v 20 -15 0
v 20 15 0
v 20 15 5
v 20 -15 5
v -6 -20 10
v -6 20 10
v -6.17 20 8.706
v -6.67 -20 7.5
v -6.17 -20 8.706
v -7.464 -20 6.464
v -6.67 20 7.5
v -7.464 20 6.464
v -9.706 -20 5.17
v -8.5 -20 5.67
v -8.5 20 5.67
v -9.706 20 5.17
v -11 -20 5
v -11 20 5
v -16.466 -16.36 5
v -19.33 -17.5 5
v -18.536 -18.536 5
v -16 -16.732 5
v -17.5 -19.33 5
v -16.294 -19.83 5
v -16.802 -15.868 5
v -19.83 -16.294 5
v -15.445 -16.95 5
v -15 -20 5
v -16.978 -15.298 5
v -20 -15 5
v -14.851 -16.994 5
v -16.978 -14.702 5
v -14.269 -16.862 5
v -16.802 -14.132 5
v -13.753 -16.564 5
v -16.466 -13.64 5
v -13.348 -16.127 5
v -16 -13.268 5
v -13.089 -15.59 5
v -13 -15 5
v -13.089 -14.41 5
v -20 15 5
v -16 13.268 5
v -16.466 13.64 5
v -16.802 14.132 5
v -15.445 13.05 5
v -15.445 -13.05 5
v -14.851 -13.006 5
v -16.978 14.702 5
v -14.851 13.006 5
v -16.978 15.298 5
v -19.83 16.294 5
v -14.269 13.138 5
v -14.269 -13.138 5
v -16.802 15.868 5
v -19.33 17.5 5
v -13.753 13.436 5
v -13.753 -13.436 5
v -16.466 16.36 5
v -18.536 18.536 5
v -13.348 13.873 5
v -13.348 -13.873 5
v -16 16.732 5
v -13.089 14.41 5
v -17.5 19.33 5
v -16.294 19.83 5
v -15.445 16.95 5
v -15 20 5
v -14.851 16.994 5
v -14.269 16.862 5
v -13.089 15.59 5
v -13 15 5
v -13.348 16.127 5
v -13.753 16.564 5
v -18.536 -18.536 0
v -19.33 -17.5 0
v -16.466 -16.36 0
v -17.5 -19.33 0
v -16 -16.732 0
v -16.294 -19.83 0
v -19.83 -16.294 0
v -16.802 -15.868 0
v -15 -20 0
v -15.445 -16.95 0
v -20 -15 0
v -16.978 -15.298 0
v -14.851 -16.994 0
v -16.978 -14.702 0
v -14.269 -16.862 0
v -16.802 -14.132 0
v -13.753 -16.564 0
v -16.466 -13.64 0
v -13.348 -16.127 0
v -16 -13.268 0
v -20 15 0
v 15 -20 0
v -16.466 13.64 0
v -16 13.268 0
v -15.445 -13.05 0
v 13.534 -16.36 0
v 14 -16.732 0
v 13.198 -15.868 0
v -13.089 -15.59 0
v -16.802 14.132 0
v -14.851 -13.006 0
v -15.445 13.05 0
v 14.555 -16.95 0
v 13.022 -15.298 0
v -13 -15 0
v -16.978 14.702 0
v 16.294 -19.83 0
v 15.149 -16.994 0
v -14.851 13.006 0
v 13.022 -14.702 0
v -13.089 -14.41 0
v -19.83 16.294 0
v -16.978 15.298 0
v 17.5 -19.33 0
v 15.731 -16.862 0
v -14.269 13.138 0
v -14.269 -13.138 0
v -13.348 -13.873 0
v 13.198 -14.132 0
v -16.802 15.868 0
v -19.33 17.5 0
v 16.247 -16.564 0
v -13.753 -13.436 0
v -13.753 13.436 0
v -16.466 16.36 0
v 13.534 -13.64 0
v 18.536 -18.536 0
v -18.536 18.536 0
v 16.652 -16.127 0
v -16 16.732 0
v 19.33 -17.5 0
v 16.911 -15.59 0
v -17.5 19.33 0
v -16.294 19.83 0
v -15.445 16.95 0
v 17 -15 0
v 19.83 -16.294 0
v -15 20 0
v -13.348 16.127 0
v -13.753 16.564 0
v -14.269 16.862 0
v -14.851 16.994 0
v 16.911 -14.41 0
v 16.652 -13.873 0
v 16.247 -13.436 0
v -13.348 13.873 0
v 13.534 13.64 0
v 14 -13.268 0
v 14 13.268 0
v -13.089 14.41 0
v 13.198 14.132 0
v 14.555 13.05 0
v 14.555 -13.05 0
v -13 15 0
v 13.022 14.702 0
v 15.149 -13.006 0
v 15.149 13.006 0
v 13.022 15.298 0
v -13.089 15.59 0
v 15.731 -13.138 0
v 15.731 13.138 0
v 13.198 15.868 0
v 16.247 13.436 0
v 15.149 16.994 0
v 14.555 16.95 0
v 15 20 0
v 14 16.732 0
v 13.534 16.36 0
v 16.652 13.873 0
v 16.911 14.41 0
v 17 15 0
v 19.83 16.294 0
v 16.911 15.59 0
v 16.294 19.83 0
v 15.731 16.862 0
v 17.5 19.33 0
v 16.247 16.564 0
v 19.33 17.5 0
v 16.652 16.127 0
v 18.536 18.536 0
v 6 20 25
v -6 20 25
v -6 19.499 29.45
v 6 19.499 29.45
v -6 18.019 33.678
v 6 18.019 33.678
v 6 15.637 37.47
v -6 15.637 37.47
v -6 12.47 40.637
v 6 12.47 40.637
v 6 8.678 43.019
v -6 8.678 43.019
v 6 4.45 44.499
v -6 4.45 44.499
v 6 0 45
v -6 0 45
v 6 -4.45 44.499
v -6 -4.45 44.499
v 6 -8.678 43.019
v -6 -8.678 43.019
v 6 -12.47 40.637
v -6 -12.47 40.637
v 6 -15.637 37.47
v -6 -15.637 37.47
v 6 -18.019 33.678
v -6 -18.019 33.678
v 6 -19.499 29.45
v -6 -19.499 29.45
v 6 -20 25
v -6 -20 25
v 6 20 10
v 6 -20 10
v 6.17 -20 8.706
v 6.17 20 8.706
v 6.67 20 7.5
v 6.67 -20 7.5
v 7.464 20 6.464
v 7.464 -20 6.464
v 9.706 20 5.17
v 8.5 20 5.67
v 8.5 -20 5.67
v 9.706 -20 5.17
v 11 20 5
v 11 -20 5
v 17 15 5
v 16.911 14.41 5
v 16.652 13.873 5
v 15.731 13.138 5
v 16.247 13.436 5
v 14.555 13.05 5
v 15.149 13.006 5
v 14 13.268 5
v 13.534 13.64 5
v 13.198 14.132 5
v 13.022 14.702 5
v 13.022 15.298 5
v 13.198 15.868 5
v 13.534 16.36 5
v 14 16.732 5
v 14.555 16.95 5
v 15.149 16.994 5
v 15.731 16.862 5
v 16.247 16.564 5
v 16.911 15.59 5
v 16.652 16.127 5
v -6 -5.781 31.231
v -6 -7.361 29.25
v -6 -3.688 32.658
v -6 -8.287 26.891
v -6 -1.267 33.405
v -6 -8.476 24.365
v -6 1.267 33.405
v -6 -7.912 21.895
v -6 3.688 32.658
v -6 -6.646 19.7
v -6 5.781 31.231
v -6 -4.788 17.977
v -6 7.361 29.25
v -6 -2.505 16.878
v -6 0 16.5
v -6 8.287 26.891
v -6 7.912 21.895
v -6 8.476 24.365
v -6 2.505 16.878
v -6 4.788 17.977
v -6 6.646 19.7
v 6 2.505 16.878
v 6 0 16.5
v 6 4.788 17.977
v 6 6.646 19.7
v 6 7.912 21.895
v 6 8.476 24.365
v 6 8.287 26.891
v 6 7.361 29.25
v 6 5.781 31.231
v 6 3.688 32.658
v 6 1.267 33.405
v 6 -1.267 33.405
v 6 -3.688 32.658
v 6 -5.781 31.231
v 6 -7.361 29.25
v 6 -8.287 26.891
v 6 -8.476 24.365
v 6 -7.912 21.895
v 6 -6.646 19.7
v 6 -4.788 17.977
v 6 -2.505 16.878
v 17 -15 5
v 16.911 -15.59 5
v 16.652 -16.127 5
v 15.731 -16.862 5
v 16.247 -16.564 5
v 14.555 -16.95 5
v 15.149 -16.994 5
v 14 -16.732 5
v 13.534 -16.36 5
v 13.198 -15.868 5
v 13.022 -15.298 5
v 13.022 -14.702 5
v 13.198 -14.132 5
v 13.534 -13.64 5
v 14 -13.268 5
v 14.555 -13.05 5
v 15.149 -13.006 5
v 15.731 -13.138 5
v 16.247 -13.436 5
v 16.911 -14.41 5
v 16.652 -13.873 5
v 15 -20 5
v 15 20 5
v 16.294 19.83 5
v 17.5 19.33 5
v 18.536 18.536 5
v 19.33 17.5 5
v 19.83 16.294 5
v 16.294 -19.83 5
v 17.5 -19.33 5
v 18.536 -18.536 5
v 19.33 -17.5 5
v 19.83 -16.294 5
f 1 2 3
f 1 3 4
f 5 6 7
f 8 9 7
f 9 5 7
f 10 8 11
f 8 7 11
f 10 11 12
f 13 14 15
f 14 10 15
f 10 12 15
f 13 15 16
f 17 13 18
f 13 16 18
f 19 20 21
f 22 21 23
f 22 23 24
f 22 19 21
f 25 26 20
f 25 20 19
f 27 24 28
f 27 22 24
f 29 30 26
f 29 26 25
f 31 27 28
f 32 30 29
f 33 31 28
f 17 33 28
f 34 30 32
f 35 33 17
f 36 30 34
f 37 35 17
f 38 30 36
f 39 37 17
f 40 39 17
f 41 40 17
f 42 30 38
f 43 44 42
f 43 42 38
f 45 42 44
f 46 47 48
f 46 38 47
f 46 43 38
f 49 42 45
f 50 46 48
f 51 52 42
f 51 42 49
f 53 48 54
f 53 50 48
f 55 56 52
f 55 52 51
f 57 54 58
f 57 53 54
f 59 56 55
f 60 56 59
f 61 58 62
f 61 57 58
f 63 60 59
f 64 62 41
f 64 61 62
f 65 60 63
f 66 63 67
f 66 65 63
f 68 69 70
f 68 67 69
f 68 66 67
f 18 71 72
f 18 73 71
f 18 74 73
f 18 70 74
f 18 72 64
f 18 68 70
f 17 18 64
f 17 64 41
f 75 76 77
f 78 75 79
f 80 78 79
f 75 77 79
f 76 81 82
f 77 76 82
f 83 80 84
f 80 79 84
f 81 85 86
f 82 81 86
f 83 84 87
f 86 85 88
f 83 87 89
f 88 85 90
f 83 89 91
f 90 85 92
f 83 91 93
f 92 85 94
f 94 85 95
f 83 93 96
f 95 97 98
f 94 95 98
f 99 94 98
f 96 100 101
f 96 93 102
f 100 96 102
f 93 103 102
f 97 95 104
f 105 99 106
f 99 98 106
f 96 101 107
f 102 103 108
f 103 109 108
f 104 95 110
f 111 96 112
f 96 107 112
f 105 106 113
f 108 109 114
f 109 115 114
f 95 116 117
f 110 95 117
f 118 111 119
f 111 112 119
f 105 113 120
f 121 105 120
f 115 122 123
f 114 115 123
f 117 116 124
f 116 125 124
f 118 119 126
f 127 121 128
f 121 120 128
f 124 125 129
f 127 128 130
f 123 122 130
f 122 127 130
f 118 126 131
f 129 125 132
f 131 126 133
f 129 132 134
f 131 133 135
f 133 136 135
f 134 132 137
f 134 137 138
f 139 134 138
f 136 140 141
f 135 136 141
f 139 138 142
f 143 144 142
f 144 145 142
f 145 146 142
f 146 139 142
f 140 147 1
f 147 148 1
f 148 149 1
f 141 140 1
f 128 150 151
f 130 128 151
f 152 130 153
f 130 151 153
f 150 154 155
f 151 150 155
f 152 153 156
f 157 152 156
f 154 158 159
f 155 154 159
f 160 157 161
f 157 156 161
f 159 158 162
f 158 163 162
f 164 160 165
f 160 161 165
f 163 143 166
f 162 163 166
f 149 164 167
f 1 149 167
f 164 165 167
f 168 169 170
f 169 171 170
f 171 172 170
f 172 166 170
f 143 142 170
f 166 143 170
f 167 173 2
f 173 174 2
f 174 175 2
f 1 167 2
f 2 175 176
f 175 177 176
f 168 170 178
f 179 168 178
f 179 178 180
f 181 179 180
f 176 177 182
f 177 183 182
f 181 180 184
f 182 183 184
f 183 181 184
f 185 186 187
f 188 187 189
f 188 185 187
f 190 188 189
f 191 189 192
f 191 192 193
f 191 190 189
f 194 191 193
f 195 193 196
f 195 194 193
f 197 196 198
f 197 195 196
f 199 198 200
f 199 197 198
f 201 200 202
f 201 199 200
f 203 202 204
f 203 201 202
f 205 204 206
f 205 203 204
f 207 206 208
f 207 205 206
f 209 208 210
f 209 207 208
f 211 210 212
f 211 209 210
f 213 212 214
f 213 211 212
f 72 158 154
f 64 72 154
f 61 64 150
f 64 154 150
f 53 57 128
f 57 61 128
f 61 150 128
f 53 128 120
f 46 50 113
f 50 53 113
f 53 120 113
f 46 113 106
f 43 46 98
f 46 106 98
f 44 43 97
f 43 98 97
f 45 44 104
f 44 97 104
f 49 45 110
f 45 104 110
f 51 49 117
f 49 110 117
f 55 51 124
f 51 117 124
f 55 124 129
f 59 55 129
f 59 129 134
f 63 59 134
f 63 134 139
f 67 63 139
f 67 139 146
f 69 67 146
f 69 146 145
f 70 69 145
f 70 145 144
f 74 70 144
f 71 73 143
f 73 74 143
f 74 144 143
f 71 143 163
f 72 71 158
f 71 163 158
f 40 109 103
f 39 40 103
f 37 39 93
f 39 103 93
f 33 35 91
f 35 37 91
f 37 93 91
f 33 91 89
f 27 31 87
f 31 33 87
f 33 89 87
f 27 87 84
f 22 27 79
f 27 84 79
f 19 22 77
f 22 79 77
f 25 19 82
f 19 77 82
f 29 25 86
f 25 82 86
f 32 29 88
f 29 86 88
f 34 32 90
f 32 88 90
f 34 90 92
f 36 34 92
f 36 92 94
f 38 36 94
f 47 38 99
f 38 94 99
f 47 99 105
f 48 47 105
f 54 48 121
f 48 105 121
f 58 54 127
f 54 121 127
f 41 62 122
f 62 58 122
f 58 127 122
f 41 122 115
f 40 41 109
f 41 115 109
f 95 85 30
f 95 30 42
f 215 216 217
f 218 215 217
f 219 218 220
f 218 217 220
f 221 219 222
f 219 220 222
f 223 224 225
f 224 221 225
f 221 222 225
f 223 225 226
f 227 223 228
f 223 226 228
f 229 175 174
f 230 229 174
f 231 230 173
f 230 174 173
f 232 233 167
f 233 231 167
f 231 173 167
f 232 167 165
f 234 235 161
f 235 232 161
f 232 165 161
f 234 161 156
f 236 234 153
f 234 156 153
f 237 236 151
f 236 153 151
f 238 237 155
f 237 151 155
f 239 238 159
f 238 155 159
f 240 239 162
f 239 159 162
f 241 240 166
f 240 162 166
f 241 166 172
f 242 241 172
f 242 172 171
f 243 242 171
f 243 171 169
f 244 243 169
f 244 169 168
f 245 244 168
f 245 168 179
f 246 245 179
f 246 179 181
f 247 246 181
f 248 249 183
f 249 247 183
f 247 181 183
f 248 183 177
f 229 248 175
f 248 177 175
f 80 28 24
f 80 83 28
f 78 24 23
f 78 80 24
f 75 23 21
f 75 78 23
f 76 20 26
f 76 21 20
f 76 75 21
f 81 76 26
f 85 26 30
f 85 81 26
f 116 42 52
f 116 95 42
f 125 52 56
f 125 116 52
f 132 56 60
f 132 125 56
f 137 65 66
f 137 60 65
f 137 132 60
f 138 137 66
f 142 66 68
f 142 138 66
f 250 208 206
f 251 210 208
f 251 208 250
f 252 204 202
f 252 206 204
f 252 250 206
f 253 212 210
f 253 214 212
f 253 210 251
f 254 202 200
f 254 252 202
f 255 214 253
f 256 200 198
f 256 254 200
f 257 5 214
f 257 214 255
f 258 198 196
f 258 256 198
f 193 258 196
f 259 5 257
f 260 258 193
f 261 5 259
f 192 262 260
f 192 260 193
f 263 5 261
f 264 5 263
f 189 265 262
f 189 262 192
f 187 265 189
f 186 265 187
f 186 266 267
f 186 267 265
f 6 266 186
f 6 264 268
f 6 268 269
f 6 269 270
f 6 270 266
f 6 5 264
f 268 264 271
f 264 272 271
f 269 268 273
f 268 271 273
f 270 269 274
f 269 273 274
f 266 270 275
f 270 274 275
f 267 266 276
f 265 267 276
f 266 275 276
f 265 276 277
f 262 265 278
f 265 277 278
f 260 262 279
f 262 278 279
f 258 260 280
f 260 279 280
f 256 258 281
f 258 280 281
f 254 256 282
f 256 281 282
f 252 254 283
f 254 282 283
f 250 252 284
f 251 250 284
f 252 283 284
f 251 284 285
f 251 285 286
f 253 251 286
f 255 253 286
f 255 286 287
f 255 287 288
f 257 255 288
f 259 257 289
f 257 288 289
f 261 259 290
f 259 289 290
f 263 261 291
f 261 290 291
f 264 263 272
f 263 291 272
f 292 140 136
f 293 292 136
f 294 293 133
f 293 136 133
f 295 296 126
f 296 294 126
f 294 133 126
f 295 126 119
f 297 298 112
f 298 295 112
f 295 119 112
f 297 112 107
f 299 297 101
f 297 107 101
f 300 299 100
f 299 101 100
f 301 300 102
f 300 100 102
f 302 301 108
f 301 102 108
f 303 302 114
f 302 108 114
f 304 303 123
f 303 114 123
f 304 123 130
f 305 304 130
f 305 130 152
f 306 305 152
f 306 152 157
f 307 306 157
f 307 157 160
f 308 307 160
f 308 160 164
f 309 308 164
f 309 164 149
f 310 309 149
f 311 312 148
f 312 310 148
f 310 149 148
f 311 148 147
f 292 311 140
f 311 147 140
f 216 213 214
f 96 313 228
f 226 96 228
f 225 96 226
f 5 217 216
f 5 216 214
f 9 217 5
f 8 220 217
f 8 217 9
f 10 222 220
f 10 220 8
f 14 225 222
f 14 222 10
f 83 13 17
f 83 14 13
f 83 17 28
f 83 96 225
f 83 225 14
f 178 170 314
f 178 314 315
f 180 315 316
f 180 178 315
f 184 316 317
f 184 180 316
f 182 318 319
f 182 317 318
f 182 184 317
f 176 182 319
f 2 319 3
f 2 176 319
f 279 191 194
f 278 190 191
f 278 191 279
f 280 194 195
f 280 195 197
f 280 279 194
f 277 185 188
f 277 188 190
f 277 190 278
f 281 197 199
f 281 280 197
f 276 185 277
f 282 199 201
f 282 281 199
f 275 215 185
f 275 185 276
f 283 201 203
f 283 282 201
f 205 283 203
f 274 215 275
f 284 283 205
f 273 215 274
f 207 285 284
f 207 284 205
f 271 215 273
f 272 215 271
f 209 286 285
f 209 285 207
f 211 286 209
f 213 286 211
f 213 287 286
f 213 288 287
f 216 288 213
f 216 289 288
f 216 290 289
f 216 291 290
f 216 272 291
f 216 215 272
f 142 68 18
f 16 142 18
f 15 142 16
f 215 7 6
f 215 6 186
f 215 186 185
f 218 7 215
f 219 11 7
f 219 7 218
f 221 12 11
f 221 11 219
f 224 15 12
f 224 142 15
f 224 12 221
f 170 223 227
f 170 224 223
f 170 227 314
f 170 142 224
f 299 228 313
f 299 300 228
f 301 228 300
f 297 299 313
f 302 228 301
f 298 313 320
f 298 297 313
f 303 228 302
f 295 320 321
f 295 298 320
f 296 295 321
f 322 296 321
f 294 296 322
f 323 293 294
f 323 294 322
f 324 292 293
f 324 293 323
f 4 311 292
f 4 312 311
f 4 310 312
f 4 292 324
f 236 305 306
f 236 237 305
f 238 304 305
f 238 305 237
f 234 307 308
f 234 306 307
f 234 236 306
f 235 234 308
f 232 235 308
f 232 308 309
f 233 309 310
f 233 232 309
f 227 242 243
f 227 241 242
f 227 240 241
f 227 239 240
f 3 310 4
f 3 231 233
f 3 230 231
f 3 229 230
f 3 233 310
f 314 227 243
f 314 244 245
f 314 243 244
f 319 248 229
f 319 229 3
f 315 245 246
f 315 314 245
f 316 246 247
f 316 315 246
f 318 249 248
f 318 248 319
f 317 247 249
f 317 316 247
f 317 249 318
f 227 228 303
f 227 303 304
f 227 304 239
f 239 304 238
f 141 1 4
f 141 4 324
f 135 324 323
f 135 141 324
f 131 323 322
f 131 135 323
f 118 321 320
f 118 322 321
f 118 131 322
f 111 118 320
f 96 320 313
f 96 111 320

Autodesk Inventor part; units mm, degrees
ref_plane "YZ Plane" through (0, 0, 0) normal (1, 0, 0) x (0, 1, 0)
ref_plane "XZ Plane" through (0, 0, 0) normal (0, 1, 0) x (-1, 0, 0)
ref_plane "XY Plane" through (0, 0, 0) normal (0, 0, 1) x (1, 0, 0)
sketch "Sketch5" plane through (0, 0, 0) normal (0, 0, 1) x (1, 0, 0)
  line L0 (-15, 15) -> (15, 15) construction
  line L1 (15, 15) -> (15, -15) construction
  line L2 (15, -15) -> (-15, -15) construction
  line L3 (-15, -15) -> (-15, 15) construction
  line L4 (-15, 15) -> (15, -15) construction
  line L5 (15, 15) -> (-15, -15) construction
  circle A0 centre (-15, 15) radius 2
  circle A1 centre (15, 15) radius 2
  circle A2 centre (15, -15) radius 2
  circle A3 centre (-15, -15) radius 2
  line L6 (-15, 20) -> (15, 20)
  line L7 (20, 15) -> (20, -15)
  line L8 (15, -20) -> (-15, -20)
  line L9 (-20, -15) -> (-20, 15)
  line L10 (-20, 20) -> (20, -20) construction
  line L11 (20, 20) -> (-20, -20) construction
  arc A4 (20, 15) -> (15, 20) centre (15, 15) ccw
  arc A5 (15, -20) -> (20, -15) centre (15, -15) ccw
  arc A6 (-20, -15) -> (-15, -20) centre (-15, -15) ccw
  arc A7 (-15, 20) -> (-20, 15) centre (-15, 15) ccw
  point P0 (0, 0)
  dimension "d16" = 4
  dimension "d17" = 30
  dimension "d18" = 40
  dimension "d20" = 5
extrude "Extrusion5" add sketch "Sketch5" along normal blind 5
sketch "Sketch6" plane through (0, 0, 5) normal (0, 0, 1) x (1, 0, 0)
  line L0 (-15, -20) -> (15, -20) projected
  line L1 (-6, 20) -> (6, 20)
  line L2 (6, 20) -> (6, -20)
  line L3 (6, -20) -> (-6, -20)
  line L4 (-6, -20) -> (-6, 20)
  line L5 (-6, 20) -> (6, -20) construction
  line L6 (6, 20) -> (-6, -20) construction
  point P0 (0, 0)
  dimension "d23" = 12
extrude "Extrusion6" add sketch "Sketch6" along normal blind 40
fillet "Fillet2" radius 5 2 edges at (6, 0, 5) (-6, 0, 5)
sketch "Sketch7" plane through (6, -20, 45) normal (1, 0, 0) x (0, 0, -1)
  circle A0 centre (20, 20) radius 8.5
  circle A1 centre (20, 20) radius 20
  line L0 (0, 0) -> (0, 40) projected
  line L1 (40, 0) -> (40, 40) projected
  line L2 (35, 0) -> (0, 0) projected
  line L3 (20, 0) -> (0, 0)
  line L4 (0, 0) -> (0, 40)
  line L5 (0, 40) -> (20, 40)
  line L6 (35, 40) -> (0, 40) projected
  point P0 (45, 20)
  point P1 (0, 20)
  dimension "d27" = 17
extrude "Extrusion7" cut sketch "Sketch7" against normal blind 50 contours A0 | A1 L0 L5 | L2 L0 A1
sketch "Sketch1" plane through (0, 0, 0) normal (0, 1, 0) x (-1, 0, 0)
  line L0 (27.5, 22.5) -> (-27.5, 22.5)
  line L1 (-27.5, 22.5) -> (-27.5, -22.5)
  line L2 (-27.5, -22.5) -> (27.5, -22.5)
  line L3 (27.5, -22.5) -> (27.5, 22.5)
  point P0 (0, 0)
  point P1 (27.5, 0)
  point P2 (0, -22.5)
  dimension "d0" = 45
  dimension "d1" = 55
sketch "Sketch2" plane through (0, 10, 0) normal (0, 1, 0) x (1, 0, 0)
  line L0 (-27.5, 22.5) -> (-27.5, -22.5) projected
  line L1 (-27.5, -22.5) -> (27.5, -22.5) projected
  line L2 (-27.5, 22.5) -> (-19.5, 22.5)
  line L3 (-19.5, 22.5) -> (-19.5, -22.5)
  line L4 (-19.5, -22.5) -> (-27.5, -22.5)
  line L5 (-27.5, -22.5) -> (-27.5, 22.5)
  line L6 (27.5, -22.5) -> (27.5, 22.5) projected
  line L7 (27.5, 22.5) -> (19.5, 22.5)
  line L8 (19.5, 22.5) -> (19.5, -22.5)
  line L9 (19.5, -22.5) -> (27.5, -22.5)
  line L10 (27.5, -22.5) -> (27.5, 22.5)
  point P0 (0, 0)
  dimension "d4" = 8
  dimension "d5" = 8
sketch "Sketch4" plane through (0, 0, 0) normal (0, -1, 0) x (1, 0, 0)
  line L0 (15, 15) -> (-15, 15) construction
  line L1 (-15, 15) -> (-15, -15) construction
  line L2 (-15, -15) -> (15, -15) construction
  line L3 (15, -15) -> (15, 15) construction
  line L4 (15, 15) -> (-15, -15) construction
  line L5 (-15, 15) -> (15, -15) construction
  circle A0 centre (15, -15) radius 2
  circle A1 centre (-15, -15) radius 2
  circle A2 centre (-15, 15) radius 2
  circle A3 centre (15, 15) radius 2
  point P0 (0, 0)
  dimension "d12" = 30
  dimension "d13" = 4
sketch "Sketch3" plane through (27.5, 0, 22.5) normal (1, 0, 0) x (0, 0, -1)
  circle A0 centre (22.5, 25) radius 15
  line L0 (22.5, 25) -> (22.5, 47.5) construction
  line L1 (45, 47.5) -> (0, 47.5) projected
  line L2 (22.5, 25) -> (45, 25) construction
  line L3 (45, 0) -> (45, 47.5) projected
  point P0 (22.5, 0)
  dimension "d9" = 30
properties part number "Hinge"
